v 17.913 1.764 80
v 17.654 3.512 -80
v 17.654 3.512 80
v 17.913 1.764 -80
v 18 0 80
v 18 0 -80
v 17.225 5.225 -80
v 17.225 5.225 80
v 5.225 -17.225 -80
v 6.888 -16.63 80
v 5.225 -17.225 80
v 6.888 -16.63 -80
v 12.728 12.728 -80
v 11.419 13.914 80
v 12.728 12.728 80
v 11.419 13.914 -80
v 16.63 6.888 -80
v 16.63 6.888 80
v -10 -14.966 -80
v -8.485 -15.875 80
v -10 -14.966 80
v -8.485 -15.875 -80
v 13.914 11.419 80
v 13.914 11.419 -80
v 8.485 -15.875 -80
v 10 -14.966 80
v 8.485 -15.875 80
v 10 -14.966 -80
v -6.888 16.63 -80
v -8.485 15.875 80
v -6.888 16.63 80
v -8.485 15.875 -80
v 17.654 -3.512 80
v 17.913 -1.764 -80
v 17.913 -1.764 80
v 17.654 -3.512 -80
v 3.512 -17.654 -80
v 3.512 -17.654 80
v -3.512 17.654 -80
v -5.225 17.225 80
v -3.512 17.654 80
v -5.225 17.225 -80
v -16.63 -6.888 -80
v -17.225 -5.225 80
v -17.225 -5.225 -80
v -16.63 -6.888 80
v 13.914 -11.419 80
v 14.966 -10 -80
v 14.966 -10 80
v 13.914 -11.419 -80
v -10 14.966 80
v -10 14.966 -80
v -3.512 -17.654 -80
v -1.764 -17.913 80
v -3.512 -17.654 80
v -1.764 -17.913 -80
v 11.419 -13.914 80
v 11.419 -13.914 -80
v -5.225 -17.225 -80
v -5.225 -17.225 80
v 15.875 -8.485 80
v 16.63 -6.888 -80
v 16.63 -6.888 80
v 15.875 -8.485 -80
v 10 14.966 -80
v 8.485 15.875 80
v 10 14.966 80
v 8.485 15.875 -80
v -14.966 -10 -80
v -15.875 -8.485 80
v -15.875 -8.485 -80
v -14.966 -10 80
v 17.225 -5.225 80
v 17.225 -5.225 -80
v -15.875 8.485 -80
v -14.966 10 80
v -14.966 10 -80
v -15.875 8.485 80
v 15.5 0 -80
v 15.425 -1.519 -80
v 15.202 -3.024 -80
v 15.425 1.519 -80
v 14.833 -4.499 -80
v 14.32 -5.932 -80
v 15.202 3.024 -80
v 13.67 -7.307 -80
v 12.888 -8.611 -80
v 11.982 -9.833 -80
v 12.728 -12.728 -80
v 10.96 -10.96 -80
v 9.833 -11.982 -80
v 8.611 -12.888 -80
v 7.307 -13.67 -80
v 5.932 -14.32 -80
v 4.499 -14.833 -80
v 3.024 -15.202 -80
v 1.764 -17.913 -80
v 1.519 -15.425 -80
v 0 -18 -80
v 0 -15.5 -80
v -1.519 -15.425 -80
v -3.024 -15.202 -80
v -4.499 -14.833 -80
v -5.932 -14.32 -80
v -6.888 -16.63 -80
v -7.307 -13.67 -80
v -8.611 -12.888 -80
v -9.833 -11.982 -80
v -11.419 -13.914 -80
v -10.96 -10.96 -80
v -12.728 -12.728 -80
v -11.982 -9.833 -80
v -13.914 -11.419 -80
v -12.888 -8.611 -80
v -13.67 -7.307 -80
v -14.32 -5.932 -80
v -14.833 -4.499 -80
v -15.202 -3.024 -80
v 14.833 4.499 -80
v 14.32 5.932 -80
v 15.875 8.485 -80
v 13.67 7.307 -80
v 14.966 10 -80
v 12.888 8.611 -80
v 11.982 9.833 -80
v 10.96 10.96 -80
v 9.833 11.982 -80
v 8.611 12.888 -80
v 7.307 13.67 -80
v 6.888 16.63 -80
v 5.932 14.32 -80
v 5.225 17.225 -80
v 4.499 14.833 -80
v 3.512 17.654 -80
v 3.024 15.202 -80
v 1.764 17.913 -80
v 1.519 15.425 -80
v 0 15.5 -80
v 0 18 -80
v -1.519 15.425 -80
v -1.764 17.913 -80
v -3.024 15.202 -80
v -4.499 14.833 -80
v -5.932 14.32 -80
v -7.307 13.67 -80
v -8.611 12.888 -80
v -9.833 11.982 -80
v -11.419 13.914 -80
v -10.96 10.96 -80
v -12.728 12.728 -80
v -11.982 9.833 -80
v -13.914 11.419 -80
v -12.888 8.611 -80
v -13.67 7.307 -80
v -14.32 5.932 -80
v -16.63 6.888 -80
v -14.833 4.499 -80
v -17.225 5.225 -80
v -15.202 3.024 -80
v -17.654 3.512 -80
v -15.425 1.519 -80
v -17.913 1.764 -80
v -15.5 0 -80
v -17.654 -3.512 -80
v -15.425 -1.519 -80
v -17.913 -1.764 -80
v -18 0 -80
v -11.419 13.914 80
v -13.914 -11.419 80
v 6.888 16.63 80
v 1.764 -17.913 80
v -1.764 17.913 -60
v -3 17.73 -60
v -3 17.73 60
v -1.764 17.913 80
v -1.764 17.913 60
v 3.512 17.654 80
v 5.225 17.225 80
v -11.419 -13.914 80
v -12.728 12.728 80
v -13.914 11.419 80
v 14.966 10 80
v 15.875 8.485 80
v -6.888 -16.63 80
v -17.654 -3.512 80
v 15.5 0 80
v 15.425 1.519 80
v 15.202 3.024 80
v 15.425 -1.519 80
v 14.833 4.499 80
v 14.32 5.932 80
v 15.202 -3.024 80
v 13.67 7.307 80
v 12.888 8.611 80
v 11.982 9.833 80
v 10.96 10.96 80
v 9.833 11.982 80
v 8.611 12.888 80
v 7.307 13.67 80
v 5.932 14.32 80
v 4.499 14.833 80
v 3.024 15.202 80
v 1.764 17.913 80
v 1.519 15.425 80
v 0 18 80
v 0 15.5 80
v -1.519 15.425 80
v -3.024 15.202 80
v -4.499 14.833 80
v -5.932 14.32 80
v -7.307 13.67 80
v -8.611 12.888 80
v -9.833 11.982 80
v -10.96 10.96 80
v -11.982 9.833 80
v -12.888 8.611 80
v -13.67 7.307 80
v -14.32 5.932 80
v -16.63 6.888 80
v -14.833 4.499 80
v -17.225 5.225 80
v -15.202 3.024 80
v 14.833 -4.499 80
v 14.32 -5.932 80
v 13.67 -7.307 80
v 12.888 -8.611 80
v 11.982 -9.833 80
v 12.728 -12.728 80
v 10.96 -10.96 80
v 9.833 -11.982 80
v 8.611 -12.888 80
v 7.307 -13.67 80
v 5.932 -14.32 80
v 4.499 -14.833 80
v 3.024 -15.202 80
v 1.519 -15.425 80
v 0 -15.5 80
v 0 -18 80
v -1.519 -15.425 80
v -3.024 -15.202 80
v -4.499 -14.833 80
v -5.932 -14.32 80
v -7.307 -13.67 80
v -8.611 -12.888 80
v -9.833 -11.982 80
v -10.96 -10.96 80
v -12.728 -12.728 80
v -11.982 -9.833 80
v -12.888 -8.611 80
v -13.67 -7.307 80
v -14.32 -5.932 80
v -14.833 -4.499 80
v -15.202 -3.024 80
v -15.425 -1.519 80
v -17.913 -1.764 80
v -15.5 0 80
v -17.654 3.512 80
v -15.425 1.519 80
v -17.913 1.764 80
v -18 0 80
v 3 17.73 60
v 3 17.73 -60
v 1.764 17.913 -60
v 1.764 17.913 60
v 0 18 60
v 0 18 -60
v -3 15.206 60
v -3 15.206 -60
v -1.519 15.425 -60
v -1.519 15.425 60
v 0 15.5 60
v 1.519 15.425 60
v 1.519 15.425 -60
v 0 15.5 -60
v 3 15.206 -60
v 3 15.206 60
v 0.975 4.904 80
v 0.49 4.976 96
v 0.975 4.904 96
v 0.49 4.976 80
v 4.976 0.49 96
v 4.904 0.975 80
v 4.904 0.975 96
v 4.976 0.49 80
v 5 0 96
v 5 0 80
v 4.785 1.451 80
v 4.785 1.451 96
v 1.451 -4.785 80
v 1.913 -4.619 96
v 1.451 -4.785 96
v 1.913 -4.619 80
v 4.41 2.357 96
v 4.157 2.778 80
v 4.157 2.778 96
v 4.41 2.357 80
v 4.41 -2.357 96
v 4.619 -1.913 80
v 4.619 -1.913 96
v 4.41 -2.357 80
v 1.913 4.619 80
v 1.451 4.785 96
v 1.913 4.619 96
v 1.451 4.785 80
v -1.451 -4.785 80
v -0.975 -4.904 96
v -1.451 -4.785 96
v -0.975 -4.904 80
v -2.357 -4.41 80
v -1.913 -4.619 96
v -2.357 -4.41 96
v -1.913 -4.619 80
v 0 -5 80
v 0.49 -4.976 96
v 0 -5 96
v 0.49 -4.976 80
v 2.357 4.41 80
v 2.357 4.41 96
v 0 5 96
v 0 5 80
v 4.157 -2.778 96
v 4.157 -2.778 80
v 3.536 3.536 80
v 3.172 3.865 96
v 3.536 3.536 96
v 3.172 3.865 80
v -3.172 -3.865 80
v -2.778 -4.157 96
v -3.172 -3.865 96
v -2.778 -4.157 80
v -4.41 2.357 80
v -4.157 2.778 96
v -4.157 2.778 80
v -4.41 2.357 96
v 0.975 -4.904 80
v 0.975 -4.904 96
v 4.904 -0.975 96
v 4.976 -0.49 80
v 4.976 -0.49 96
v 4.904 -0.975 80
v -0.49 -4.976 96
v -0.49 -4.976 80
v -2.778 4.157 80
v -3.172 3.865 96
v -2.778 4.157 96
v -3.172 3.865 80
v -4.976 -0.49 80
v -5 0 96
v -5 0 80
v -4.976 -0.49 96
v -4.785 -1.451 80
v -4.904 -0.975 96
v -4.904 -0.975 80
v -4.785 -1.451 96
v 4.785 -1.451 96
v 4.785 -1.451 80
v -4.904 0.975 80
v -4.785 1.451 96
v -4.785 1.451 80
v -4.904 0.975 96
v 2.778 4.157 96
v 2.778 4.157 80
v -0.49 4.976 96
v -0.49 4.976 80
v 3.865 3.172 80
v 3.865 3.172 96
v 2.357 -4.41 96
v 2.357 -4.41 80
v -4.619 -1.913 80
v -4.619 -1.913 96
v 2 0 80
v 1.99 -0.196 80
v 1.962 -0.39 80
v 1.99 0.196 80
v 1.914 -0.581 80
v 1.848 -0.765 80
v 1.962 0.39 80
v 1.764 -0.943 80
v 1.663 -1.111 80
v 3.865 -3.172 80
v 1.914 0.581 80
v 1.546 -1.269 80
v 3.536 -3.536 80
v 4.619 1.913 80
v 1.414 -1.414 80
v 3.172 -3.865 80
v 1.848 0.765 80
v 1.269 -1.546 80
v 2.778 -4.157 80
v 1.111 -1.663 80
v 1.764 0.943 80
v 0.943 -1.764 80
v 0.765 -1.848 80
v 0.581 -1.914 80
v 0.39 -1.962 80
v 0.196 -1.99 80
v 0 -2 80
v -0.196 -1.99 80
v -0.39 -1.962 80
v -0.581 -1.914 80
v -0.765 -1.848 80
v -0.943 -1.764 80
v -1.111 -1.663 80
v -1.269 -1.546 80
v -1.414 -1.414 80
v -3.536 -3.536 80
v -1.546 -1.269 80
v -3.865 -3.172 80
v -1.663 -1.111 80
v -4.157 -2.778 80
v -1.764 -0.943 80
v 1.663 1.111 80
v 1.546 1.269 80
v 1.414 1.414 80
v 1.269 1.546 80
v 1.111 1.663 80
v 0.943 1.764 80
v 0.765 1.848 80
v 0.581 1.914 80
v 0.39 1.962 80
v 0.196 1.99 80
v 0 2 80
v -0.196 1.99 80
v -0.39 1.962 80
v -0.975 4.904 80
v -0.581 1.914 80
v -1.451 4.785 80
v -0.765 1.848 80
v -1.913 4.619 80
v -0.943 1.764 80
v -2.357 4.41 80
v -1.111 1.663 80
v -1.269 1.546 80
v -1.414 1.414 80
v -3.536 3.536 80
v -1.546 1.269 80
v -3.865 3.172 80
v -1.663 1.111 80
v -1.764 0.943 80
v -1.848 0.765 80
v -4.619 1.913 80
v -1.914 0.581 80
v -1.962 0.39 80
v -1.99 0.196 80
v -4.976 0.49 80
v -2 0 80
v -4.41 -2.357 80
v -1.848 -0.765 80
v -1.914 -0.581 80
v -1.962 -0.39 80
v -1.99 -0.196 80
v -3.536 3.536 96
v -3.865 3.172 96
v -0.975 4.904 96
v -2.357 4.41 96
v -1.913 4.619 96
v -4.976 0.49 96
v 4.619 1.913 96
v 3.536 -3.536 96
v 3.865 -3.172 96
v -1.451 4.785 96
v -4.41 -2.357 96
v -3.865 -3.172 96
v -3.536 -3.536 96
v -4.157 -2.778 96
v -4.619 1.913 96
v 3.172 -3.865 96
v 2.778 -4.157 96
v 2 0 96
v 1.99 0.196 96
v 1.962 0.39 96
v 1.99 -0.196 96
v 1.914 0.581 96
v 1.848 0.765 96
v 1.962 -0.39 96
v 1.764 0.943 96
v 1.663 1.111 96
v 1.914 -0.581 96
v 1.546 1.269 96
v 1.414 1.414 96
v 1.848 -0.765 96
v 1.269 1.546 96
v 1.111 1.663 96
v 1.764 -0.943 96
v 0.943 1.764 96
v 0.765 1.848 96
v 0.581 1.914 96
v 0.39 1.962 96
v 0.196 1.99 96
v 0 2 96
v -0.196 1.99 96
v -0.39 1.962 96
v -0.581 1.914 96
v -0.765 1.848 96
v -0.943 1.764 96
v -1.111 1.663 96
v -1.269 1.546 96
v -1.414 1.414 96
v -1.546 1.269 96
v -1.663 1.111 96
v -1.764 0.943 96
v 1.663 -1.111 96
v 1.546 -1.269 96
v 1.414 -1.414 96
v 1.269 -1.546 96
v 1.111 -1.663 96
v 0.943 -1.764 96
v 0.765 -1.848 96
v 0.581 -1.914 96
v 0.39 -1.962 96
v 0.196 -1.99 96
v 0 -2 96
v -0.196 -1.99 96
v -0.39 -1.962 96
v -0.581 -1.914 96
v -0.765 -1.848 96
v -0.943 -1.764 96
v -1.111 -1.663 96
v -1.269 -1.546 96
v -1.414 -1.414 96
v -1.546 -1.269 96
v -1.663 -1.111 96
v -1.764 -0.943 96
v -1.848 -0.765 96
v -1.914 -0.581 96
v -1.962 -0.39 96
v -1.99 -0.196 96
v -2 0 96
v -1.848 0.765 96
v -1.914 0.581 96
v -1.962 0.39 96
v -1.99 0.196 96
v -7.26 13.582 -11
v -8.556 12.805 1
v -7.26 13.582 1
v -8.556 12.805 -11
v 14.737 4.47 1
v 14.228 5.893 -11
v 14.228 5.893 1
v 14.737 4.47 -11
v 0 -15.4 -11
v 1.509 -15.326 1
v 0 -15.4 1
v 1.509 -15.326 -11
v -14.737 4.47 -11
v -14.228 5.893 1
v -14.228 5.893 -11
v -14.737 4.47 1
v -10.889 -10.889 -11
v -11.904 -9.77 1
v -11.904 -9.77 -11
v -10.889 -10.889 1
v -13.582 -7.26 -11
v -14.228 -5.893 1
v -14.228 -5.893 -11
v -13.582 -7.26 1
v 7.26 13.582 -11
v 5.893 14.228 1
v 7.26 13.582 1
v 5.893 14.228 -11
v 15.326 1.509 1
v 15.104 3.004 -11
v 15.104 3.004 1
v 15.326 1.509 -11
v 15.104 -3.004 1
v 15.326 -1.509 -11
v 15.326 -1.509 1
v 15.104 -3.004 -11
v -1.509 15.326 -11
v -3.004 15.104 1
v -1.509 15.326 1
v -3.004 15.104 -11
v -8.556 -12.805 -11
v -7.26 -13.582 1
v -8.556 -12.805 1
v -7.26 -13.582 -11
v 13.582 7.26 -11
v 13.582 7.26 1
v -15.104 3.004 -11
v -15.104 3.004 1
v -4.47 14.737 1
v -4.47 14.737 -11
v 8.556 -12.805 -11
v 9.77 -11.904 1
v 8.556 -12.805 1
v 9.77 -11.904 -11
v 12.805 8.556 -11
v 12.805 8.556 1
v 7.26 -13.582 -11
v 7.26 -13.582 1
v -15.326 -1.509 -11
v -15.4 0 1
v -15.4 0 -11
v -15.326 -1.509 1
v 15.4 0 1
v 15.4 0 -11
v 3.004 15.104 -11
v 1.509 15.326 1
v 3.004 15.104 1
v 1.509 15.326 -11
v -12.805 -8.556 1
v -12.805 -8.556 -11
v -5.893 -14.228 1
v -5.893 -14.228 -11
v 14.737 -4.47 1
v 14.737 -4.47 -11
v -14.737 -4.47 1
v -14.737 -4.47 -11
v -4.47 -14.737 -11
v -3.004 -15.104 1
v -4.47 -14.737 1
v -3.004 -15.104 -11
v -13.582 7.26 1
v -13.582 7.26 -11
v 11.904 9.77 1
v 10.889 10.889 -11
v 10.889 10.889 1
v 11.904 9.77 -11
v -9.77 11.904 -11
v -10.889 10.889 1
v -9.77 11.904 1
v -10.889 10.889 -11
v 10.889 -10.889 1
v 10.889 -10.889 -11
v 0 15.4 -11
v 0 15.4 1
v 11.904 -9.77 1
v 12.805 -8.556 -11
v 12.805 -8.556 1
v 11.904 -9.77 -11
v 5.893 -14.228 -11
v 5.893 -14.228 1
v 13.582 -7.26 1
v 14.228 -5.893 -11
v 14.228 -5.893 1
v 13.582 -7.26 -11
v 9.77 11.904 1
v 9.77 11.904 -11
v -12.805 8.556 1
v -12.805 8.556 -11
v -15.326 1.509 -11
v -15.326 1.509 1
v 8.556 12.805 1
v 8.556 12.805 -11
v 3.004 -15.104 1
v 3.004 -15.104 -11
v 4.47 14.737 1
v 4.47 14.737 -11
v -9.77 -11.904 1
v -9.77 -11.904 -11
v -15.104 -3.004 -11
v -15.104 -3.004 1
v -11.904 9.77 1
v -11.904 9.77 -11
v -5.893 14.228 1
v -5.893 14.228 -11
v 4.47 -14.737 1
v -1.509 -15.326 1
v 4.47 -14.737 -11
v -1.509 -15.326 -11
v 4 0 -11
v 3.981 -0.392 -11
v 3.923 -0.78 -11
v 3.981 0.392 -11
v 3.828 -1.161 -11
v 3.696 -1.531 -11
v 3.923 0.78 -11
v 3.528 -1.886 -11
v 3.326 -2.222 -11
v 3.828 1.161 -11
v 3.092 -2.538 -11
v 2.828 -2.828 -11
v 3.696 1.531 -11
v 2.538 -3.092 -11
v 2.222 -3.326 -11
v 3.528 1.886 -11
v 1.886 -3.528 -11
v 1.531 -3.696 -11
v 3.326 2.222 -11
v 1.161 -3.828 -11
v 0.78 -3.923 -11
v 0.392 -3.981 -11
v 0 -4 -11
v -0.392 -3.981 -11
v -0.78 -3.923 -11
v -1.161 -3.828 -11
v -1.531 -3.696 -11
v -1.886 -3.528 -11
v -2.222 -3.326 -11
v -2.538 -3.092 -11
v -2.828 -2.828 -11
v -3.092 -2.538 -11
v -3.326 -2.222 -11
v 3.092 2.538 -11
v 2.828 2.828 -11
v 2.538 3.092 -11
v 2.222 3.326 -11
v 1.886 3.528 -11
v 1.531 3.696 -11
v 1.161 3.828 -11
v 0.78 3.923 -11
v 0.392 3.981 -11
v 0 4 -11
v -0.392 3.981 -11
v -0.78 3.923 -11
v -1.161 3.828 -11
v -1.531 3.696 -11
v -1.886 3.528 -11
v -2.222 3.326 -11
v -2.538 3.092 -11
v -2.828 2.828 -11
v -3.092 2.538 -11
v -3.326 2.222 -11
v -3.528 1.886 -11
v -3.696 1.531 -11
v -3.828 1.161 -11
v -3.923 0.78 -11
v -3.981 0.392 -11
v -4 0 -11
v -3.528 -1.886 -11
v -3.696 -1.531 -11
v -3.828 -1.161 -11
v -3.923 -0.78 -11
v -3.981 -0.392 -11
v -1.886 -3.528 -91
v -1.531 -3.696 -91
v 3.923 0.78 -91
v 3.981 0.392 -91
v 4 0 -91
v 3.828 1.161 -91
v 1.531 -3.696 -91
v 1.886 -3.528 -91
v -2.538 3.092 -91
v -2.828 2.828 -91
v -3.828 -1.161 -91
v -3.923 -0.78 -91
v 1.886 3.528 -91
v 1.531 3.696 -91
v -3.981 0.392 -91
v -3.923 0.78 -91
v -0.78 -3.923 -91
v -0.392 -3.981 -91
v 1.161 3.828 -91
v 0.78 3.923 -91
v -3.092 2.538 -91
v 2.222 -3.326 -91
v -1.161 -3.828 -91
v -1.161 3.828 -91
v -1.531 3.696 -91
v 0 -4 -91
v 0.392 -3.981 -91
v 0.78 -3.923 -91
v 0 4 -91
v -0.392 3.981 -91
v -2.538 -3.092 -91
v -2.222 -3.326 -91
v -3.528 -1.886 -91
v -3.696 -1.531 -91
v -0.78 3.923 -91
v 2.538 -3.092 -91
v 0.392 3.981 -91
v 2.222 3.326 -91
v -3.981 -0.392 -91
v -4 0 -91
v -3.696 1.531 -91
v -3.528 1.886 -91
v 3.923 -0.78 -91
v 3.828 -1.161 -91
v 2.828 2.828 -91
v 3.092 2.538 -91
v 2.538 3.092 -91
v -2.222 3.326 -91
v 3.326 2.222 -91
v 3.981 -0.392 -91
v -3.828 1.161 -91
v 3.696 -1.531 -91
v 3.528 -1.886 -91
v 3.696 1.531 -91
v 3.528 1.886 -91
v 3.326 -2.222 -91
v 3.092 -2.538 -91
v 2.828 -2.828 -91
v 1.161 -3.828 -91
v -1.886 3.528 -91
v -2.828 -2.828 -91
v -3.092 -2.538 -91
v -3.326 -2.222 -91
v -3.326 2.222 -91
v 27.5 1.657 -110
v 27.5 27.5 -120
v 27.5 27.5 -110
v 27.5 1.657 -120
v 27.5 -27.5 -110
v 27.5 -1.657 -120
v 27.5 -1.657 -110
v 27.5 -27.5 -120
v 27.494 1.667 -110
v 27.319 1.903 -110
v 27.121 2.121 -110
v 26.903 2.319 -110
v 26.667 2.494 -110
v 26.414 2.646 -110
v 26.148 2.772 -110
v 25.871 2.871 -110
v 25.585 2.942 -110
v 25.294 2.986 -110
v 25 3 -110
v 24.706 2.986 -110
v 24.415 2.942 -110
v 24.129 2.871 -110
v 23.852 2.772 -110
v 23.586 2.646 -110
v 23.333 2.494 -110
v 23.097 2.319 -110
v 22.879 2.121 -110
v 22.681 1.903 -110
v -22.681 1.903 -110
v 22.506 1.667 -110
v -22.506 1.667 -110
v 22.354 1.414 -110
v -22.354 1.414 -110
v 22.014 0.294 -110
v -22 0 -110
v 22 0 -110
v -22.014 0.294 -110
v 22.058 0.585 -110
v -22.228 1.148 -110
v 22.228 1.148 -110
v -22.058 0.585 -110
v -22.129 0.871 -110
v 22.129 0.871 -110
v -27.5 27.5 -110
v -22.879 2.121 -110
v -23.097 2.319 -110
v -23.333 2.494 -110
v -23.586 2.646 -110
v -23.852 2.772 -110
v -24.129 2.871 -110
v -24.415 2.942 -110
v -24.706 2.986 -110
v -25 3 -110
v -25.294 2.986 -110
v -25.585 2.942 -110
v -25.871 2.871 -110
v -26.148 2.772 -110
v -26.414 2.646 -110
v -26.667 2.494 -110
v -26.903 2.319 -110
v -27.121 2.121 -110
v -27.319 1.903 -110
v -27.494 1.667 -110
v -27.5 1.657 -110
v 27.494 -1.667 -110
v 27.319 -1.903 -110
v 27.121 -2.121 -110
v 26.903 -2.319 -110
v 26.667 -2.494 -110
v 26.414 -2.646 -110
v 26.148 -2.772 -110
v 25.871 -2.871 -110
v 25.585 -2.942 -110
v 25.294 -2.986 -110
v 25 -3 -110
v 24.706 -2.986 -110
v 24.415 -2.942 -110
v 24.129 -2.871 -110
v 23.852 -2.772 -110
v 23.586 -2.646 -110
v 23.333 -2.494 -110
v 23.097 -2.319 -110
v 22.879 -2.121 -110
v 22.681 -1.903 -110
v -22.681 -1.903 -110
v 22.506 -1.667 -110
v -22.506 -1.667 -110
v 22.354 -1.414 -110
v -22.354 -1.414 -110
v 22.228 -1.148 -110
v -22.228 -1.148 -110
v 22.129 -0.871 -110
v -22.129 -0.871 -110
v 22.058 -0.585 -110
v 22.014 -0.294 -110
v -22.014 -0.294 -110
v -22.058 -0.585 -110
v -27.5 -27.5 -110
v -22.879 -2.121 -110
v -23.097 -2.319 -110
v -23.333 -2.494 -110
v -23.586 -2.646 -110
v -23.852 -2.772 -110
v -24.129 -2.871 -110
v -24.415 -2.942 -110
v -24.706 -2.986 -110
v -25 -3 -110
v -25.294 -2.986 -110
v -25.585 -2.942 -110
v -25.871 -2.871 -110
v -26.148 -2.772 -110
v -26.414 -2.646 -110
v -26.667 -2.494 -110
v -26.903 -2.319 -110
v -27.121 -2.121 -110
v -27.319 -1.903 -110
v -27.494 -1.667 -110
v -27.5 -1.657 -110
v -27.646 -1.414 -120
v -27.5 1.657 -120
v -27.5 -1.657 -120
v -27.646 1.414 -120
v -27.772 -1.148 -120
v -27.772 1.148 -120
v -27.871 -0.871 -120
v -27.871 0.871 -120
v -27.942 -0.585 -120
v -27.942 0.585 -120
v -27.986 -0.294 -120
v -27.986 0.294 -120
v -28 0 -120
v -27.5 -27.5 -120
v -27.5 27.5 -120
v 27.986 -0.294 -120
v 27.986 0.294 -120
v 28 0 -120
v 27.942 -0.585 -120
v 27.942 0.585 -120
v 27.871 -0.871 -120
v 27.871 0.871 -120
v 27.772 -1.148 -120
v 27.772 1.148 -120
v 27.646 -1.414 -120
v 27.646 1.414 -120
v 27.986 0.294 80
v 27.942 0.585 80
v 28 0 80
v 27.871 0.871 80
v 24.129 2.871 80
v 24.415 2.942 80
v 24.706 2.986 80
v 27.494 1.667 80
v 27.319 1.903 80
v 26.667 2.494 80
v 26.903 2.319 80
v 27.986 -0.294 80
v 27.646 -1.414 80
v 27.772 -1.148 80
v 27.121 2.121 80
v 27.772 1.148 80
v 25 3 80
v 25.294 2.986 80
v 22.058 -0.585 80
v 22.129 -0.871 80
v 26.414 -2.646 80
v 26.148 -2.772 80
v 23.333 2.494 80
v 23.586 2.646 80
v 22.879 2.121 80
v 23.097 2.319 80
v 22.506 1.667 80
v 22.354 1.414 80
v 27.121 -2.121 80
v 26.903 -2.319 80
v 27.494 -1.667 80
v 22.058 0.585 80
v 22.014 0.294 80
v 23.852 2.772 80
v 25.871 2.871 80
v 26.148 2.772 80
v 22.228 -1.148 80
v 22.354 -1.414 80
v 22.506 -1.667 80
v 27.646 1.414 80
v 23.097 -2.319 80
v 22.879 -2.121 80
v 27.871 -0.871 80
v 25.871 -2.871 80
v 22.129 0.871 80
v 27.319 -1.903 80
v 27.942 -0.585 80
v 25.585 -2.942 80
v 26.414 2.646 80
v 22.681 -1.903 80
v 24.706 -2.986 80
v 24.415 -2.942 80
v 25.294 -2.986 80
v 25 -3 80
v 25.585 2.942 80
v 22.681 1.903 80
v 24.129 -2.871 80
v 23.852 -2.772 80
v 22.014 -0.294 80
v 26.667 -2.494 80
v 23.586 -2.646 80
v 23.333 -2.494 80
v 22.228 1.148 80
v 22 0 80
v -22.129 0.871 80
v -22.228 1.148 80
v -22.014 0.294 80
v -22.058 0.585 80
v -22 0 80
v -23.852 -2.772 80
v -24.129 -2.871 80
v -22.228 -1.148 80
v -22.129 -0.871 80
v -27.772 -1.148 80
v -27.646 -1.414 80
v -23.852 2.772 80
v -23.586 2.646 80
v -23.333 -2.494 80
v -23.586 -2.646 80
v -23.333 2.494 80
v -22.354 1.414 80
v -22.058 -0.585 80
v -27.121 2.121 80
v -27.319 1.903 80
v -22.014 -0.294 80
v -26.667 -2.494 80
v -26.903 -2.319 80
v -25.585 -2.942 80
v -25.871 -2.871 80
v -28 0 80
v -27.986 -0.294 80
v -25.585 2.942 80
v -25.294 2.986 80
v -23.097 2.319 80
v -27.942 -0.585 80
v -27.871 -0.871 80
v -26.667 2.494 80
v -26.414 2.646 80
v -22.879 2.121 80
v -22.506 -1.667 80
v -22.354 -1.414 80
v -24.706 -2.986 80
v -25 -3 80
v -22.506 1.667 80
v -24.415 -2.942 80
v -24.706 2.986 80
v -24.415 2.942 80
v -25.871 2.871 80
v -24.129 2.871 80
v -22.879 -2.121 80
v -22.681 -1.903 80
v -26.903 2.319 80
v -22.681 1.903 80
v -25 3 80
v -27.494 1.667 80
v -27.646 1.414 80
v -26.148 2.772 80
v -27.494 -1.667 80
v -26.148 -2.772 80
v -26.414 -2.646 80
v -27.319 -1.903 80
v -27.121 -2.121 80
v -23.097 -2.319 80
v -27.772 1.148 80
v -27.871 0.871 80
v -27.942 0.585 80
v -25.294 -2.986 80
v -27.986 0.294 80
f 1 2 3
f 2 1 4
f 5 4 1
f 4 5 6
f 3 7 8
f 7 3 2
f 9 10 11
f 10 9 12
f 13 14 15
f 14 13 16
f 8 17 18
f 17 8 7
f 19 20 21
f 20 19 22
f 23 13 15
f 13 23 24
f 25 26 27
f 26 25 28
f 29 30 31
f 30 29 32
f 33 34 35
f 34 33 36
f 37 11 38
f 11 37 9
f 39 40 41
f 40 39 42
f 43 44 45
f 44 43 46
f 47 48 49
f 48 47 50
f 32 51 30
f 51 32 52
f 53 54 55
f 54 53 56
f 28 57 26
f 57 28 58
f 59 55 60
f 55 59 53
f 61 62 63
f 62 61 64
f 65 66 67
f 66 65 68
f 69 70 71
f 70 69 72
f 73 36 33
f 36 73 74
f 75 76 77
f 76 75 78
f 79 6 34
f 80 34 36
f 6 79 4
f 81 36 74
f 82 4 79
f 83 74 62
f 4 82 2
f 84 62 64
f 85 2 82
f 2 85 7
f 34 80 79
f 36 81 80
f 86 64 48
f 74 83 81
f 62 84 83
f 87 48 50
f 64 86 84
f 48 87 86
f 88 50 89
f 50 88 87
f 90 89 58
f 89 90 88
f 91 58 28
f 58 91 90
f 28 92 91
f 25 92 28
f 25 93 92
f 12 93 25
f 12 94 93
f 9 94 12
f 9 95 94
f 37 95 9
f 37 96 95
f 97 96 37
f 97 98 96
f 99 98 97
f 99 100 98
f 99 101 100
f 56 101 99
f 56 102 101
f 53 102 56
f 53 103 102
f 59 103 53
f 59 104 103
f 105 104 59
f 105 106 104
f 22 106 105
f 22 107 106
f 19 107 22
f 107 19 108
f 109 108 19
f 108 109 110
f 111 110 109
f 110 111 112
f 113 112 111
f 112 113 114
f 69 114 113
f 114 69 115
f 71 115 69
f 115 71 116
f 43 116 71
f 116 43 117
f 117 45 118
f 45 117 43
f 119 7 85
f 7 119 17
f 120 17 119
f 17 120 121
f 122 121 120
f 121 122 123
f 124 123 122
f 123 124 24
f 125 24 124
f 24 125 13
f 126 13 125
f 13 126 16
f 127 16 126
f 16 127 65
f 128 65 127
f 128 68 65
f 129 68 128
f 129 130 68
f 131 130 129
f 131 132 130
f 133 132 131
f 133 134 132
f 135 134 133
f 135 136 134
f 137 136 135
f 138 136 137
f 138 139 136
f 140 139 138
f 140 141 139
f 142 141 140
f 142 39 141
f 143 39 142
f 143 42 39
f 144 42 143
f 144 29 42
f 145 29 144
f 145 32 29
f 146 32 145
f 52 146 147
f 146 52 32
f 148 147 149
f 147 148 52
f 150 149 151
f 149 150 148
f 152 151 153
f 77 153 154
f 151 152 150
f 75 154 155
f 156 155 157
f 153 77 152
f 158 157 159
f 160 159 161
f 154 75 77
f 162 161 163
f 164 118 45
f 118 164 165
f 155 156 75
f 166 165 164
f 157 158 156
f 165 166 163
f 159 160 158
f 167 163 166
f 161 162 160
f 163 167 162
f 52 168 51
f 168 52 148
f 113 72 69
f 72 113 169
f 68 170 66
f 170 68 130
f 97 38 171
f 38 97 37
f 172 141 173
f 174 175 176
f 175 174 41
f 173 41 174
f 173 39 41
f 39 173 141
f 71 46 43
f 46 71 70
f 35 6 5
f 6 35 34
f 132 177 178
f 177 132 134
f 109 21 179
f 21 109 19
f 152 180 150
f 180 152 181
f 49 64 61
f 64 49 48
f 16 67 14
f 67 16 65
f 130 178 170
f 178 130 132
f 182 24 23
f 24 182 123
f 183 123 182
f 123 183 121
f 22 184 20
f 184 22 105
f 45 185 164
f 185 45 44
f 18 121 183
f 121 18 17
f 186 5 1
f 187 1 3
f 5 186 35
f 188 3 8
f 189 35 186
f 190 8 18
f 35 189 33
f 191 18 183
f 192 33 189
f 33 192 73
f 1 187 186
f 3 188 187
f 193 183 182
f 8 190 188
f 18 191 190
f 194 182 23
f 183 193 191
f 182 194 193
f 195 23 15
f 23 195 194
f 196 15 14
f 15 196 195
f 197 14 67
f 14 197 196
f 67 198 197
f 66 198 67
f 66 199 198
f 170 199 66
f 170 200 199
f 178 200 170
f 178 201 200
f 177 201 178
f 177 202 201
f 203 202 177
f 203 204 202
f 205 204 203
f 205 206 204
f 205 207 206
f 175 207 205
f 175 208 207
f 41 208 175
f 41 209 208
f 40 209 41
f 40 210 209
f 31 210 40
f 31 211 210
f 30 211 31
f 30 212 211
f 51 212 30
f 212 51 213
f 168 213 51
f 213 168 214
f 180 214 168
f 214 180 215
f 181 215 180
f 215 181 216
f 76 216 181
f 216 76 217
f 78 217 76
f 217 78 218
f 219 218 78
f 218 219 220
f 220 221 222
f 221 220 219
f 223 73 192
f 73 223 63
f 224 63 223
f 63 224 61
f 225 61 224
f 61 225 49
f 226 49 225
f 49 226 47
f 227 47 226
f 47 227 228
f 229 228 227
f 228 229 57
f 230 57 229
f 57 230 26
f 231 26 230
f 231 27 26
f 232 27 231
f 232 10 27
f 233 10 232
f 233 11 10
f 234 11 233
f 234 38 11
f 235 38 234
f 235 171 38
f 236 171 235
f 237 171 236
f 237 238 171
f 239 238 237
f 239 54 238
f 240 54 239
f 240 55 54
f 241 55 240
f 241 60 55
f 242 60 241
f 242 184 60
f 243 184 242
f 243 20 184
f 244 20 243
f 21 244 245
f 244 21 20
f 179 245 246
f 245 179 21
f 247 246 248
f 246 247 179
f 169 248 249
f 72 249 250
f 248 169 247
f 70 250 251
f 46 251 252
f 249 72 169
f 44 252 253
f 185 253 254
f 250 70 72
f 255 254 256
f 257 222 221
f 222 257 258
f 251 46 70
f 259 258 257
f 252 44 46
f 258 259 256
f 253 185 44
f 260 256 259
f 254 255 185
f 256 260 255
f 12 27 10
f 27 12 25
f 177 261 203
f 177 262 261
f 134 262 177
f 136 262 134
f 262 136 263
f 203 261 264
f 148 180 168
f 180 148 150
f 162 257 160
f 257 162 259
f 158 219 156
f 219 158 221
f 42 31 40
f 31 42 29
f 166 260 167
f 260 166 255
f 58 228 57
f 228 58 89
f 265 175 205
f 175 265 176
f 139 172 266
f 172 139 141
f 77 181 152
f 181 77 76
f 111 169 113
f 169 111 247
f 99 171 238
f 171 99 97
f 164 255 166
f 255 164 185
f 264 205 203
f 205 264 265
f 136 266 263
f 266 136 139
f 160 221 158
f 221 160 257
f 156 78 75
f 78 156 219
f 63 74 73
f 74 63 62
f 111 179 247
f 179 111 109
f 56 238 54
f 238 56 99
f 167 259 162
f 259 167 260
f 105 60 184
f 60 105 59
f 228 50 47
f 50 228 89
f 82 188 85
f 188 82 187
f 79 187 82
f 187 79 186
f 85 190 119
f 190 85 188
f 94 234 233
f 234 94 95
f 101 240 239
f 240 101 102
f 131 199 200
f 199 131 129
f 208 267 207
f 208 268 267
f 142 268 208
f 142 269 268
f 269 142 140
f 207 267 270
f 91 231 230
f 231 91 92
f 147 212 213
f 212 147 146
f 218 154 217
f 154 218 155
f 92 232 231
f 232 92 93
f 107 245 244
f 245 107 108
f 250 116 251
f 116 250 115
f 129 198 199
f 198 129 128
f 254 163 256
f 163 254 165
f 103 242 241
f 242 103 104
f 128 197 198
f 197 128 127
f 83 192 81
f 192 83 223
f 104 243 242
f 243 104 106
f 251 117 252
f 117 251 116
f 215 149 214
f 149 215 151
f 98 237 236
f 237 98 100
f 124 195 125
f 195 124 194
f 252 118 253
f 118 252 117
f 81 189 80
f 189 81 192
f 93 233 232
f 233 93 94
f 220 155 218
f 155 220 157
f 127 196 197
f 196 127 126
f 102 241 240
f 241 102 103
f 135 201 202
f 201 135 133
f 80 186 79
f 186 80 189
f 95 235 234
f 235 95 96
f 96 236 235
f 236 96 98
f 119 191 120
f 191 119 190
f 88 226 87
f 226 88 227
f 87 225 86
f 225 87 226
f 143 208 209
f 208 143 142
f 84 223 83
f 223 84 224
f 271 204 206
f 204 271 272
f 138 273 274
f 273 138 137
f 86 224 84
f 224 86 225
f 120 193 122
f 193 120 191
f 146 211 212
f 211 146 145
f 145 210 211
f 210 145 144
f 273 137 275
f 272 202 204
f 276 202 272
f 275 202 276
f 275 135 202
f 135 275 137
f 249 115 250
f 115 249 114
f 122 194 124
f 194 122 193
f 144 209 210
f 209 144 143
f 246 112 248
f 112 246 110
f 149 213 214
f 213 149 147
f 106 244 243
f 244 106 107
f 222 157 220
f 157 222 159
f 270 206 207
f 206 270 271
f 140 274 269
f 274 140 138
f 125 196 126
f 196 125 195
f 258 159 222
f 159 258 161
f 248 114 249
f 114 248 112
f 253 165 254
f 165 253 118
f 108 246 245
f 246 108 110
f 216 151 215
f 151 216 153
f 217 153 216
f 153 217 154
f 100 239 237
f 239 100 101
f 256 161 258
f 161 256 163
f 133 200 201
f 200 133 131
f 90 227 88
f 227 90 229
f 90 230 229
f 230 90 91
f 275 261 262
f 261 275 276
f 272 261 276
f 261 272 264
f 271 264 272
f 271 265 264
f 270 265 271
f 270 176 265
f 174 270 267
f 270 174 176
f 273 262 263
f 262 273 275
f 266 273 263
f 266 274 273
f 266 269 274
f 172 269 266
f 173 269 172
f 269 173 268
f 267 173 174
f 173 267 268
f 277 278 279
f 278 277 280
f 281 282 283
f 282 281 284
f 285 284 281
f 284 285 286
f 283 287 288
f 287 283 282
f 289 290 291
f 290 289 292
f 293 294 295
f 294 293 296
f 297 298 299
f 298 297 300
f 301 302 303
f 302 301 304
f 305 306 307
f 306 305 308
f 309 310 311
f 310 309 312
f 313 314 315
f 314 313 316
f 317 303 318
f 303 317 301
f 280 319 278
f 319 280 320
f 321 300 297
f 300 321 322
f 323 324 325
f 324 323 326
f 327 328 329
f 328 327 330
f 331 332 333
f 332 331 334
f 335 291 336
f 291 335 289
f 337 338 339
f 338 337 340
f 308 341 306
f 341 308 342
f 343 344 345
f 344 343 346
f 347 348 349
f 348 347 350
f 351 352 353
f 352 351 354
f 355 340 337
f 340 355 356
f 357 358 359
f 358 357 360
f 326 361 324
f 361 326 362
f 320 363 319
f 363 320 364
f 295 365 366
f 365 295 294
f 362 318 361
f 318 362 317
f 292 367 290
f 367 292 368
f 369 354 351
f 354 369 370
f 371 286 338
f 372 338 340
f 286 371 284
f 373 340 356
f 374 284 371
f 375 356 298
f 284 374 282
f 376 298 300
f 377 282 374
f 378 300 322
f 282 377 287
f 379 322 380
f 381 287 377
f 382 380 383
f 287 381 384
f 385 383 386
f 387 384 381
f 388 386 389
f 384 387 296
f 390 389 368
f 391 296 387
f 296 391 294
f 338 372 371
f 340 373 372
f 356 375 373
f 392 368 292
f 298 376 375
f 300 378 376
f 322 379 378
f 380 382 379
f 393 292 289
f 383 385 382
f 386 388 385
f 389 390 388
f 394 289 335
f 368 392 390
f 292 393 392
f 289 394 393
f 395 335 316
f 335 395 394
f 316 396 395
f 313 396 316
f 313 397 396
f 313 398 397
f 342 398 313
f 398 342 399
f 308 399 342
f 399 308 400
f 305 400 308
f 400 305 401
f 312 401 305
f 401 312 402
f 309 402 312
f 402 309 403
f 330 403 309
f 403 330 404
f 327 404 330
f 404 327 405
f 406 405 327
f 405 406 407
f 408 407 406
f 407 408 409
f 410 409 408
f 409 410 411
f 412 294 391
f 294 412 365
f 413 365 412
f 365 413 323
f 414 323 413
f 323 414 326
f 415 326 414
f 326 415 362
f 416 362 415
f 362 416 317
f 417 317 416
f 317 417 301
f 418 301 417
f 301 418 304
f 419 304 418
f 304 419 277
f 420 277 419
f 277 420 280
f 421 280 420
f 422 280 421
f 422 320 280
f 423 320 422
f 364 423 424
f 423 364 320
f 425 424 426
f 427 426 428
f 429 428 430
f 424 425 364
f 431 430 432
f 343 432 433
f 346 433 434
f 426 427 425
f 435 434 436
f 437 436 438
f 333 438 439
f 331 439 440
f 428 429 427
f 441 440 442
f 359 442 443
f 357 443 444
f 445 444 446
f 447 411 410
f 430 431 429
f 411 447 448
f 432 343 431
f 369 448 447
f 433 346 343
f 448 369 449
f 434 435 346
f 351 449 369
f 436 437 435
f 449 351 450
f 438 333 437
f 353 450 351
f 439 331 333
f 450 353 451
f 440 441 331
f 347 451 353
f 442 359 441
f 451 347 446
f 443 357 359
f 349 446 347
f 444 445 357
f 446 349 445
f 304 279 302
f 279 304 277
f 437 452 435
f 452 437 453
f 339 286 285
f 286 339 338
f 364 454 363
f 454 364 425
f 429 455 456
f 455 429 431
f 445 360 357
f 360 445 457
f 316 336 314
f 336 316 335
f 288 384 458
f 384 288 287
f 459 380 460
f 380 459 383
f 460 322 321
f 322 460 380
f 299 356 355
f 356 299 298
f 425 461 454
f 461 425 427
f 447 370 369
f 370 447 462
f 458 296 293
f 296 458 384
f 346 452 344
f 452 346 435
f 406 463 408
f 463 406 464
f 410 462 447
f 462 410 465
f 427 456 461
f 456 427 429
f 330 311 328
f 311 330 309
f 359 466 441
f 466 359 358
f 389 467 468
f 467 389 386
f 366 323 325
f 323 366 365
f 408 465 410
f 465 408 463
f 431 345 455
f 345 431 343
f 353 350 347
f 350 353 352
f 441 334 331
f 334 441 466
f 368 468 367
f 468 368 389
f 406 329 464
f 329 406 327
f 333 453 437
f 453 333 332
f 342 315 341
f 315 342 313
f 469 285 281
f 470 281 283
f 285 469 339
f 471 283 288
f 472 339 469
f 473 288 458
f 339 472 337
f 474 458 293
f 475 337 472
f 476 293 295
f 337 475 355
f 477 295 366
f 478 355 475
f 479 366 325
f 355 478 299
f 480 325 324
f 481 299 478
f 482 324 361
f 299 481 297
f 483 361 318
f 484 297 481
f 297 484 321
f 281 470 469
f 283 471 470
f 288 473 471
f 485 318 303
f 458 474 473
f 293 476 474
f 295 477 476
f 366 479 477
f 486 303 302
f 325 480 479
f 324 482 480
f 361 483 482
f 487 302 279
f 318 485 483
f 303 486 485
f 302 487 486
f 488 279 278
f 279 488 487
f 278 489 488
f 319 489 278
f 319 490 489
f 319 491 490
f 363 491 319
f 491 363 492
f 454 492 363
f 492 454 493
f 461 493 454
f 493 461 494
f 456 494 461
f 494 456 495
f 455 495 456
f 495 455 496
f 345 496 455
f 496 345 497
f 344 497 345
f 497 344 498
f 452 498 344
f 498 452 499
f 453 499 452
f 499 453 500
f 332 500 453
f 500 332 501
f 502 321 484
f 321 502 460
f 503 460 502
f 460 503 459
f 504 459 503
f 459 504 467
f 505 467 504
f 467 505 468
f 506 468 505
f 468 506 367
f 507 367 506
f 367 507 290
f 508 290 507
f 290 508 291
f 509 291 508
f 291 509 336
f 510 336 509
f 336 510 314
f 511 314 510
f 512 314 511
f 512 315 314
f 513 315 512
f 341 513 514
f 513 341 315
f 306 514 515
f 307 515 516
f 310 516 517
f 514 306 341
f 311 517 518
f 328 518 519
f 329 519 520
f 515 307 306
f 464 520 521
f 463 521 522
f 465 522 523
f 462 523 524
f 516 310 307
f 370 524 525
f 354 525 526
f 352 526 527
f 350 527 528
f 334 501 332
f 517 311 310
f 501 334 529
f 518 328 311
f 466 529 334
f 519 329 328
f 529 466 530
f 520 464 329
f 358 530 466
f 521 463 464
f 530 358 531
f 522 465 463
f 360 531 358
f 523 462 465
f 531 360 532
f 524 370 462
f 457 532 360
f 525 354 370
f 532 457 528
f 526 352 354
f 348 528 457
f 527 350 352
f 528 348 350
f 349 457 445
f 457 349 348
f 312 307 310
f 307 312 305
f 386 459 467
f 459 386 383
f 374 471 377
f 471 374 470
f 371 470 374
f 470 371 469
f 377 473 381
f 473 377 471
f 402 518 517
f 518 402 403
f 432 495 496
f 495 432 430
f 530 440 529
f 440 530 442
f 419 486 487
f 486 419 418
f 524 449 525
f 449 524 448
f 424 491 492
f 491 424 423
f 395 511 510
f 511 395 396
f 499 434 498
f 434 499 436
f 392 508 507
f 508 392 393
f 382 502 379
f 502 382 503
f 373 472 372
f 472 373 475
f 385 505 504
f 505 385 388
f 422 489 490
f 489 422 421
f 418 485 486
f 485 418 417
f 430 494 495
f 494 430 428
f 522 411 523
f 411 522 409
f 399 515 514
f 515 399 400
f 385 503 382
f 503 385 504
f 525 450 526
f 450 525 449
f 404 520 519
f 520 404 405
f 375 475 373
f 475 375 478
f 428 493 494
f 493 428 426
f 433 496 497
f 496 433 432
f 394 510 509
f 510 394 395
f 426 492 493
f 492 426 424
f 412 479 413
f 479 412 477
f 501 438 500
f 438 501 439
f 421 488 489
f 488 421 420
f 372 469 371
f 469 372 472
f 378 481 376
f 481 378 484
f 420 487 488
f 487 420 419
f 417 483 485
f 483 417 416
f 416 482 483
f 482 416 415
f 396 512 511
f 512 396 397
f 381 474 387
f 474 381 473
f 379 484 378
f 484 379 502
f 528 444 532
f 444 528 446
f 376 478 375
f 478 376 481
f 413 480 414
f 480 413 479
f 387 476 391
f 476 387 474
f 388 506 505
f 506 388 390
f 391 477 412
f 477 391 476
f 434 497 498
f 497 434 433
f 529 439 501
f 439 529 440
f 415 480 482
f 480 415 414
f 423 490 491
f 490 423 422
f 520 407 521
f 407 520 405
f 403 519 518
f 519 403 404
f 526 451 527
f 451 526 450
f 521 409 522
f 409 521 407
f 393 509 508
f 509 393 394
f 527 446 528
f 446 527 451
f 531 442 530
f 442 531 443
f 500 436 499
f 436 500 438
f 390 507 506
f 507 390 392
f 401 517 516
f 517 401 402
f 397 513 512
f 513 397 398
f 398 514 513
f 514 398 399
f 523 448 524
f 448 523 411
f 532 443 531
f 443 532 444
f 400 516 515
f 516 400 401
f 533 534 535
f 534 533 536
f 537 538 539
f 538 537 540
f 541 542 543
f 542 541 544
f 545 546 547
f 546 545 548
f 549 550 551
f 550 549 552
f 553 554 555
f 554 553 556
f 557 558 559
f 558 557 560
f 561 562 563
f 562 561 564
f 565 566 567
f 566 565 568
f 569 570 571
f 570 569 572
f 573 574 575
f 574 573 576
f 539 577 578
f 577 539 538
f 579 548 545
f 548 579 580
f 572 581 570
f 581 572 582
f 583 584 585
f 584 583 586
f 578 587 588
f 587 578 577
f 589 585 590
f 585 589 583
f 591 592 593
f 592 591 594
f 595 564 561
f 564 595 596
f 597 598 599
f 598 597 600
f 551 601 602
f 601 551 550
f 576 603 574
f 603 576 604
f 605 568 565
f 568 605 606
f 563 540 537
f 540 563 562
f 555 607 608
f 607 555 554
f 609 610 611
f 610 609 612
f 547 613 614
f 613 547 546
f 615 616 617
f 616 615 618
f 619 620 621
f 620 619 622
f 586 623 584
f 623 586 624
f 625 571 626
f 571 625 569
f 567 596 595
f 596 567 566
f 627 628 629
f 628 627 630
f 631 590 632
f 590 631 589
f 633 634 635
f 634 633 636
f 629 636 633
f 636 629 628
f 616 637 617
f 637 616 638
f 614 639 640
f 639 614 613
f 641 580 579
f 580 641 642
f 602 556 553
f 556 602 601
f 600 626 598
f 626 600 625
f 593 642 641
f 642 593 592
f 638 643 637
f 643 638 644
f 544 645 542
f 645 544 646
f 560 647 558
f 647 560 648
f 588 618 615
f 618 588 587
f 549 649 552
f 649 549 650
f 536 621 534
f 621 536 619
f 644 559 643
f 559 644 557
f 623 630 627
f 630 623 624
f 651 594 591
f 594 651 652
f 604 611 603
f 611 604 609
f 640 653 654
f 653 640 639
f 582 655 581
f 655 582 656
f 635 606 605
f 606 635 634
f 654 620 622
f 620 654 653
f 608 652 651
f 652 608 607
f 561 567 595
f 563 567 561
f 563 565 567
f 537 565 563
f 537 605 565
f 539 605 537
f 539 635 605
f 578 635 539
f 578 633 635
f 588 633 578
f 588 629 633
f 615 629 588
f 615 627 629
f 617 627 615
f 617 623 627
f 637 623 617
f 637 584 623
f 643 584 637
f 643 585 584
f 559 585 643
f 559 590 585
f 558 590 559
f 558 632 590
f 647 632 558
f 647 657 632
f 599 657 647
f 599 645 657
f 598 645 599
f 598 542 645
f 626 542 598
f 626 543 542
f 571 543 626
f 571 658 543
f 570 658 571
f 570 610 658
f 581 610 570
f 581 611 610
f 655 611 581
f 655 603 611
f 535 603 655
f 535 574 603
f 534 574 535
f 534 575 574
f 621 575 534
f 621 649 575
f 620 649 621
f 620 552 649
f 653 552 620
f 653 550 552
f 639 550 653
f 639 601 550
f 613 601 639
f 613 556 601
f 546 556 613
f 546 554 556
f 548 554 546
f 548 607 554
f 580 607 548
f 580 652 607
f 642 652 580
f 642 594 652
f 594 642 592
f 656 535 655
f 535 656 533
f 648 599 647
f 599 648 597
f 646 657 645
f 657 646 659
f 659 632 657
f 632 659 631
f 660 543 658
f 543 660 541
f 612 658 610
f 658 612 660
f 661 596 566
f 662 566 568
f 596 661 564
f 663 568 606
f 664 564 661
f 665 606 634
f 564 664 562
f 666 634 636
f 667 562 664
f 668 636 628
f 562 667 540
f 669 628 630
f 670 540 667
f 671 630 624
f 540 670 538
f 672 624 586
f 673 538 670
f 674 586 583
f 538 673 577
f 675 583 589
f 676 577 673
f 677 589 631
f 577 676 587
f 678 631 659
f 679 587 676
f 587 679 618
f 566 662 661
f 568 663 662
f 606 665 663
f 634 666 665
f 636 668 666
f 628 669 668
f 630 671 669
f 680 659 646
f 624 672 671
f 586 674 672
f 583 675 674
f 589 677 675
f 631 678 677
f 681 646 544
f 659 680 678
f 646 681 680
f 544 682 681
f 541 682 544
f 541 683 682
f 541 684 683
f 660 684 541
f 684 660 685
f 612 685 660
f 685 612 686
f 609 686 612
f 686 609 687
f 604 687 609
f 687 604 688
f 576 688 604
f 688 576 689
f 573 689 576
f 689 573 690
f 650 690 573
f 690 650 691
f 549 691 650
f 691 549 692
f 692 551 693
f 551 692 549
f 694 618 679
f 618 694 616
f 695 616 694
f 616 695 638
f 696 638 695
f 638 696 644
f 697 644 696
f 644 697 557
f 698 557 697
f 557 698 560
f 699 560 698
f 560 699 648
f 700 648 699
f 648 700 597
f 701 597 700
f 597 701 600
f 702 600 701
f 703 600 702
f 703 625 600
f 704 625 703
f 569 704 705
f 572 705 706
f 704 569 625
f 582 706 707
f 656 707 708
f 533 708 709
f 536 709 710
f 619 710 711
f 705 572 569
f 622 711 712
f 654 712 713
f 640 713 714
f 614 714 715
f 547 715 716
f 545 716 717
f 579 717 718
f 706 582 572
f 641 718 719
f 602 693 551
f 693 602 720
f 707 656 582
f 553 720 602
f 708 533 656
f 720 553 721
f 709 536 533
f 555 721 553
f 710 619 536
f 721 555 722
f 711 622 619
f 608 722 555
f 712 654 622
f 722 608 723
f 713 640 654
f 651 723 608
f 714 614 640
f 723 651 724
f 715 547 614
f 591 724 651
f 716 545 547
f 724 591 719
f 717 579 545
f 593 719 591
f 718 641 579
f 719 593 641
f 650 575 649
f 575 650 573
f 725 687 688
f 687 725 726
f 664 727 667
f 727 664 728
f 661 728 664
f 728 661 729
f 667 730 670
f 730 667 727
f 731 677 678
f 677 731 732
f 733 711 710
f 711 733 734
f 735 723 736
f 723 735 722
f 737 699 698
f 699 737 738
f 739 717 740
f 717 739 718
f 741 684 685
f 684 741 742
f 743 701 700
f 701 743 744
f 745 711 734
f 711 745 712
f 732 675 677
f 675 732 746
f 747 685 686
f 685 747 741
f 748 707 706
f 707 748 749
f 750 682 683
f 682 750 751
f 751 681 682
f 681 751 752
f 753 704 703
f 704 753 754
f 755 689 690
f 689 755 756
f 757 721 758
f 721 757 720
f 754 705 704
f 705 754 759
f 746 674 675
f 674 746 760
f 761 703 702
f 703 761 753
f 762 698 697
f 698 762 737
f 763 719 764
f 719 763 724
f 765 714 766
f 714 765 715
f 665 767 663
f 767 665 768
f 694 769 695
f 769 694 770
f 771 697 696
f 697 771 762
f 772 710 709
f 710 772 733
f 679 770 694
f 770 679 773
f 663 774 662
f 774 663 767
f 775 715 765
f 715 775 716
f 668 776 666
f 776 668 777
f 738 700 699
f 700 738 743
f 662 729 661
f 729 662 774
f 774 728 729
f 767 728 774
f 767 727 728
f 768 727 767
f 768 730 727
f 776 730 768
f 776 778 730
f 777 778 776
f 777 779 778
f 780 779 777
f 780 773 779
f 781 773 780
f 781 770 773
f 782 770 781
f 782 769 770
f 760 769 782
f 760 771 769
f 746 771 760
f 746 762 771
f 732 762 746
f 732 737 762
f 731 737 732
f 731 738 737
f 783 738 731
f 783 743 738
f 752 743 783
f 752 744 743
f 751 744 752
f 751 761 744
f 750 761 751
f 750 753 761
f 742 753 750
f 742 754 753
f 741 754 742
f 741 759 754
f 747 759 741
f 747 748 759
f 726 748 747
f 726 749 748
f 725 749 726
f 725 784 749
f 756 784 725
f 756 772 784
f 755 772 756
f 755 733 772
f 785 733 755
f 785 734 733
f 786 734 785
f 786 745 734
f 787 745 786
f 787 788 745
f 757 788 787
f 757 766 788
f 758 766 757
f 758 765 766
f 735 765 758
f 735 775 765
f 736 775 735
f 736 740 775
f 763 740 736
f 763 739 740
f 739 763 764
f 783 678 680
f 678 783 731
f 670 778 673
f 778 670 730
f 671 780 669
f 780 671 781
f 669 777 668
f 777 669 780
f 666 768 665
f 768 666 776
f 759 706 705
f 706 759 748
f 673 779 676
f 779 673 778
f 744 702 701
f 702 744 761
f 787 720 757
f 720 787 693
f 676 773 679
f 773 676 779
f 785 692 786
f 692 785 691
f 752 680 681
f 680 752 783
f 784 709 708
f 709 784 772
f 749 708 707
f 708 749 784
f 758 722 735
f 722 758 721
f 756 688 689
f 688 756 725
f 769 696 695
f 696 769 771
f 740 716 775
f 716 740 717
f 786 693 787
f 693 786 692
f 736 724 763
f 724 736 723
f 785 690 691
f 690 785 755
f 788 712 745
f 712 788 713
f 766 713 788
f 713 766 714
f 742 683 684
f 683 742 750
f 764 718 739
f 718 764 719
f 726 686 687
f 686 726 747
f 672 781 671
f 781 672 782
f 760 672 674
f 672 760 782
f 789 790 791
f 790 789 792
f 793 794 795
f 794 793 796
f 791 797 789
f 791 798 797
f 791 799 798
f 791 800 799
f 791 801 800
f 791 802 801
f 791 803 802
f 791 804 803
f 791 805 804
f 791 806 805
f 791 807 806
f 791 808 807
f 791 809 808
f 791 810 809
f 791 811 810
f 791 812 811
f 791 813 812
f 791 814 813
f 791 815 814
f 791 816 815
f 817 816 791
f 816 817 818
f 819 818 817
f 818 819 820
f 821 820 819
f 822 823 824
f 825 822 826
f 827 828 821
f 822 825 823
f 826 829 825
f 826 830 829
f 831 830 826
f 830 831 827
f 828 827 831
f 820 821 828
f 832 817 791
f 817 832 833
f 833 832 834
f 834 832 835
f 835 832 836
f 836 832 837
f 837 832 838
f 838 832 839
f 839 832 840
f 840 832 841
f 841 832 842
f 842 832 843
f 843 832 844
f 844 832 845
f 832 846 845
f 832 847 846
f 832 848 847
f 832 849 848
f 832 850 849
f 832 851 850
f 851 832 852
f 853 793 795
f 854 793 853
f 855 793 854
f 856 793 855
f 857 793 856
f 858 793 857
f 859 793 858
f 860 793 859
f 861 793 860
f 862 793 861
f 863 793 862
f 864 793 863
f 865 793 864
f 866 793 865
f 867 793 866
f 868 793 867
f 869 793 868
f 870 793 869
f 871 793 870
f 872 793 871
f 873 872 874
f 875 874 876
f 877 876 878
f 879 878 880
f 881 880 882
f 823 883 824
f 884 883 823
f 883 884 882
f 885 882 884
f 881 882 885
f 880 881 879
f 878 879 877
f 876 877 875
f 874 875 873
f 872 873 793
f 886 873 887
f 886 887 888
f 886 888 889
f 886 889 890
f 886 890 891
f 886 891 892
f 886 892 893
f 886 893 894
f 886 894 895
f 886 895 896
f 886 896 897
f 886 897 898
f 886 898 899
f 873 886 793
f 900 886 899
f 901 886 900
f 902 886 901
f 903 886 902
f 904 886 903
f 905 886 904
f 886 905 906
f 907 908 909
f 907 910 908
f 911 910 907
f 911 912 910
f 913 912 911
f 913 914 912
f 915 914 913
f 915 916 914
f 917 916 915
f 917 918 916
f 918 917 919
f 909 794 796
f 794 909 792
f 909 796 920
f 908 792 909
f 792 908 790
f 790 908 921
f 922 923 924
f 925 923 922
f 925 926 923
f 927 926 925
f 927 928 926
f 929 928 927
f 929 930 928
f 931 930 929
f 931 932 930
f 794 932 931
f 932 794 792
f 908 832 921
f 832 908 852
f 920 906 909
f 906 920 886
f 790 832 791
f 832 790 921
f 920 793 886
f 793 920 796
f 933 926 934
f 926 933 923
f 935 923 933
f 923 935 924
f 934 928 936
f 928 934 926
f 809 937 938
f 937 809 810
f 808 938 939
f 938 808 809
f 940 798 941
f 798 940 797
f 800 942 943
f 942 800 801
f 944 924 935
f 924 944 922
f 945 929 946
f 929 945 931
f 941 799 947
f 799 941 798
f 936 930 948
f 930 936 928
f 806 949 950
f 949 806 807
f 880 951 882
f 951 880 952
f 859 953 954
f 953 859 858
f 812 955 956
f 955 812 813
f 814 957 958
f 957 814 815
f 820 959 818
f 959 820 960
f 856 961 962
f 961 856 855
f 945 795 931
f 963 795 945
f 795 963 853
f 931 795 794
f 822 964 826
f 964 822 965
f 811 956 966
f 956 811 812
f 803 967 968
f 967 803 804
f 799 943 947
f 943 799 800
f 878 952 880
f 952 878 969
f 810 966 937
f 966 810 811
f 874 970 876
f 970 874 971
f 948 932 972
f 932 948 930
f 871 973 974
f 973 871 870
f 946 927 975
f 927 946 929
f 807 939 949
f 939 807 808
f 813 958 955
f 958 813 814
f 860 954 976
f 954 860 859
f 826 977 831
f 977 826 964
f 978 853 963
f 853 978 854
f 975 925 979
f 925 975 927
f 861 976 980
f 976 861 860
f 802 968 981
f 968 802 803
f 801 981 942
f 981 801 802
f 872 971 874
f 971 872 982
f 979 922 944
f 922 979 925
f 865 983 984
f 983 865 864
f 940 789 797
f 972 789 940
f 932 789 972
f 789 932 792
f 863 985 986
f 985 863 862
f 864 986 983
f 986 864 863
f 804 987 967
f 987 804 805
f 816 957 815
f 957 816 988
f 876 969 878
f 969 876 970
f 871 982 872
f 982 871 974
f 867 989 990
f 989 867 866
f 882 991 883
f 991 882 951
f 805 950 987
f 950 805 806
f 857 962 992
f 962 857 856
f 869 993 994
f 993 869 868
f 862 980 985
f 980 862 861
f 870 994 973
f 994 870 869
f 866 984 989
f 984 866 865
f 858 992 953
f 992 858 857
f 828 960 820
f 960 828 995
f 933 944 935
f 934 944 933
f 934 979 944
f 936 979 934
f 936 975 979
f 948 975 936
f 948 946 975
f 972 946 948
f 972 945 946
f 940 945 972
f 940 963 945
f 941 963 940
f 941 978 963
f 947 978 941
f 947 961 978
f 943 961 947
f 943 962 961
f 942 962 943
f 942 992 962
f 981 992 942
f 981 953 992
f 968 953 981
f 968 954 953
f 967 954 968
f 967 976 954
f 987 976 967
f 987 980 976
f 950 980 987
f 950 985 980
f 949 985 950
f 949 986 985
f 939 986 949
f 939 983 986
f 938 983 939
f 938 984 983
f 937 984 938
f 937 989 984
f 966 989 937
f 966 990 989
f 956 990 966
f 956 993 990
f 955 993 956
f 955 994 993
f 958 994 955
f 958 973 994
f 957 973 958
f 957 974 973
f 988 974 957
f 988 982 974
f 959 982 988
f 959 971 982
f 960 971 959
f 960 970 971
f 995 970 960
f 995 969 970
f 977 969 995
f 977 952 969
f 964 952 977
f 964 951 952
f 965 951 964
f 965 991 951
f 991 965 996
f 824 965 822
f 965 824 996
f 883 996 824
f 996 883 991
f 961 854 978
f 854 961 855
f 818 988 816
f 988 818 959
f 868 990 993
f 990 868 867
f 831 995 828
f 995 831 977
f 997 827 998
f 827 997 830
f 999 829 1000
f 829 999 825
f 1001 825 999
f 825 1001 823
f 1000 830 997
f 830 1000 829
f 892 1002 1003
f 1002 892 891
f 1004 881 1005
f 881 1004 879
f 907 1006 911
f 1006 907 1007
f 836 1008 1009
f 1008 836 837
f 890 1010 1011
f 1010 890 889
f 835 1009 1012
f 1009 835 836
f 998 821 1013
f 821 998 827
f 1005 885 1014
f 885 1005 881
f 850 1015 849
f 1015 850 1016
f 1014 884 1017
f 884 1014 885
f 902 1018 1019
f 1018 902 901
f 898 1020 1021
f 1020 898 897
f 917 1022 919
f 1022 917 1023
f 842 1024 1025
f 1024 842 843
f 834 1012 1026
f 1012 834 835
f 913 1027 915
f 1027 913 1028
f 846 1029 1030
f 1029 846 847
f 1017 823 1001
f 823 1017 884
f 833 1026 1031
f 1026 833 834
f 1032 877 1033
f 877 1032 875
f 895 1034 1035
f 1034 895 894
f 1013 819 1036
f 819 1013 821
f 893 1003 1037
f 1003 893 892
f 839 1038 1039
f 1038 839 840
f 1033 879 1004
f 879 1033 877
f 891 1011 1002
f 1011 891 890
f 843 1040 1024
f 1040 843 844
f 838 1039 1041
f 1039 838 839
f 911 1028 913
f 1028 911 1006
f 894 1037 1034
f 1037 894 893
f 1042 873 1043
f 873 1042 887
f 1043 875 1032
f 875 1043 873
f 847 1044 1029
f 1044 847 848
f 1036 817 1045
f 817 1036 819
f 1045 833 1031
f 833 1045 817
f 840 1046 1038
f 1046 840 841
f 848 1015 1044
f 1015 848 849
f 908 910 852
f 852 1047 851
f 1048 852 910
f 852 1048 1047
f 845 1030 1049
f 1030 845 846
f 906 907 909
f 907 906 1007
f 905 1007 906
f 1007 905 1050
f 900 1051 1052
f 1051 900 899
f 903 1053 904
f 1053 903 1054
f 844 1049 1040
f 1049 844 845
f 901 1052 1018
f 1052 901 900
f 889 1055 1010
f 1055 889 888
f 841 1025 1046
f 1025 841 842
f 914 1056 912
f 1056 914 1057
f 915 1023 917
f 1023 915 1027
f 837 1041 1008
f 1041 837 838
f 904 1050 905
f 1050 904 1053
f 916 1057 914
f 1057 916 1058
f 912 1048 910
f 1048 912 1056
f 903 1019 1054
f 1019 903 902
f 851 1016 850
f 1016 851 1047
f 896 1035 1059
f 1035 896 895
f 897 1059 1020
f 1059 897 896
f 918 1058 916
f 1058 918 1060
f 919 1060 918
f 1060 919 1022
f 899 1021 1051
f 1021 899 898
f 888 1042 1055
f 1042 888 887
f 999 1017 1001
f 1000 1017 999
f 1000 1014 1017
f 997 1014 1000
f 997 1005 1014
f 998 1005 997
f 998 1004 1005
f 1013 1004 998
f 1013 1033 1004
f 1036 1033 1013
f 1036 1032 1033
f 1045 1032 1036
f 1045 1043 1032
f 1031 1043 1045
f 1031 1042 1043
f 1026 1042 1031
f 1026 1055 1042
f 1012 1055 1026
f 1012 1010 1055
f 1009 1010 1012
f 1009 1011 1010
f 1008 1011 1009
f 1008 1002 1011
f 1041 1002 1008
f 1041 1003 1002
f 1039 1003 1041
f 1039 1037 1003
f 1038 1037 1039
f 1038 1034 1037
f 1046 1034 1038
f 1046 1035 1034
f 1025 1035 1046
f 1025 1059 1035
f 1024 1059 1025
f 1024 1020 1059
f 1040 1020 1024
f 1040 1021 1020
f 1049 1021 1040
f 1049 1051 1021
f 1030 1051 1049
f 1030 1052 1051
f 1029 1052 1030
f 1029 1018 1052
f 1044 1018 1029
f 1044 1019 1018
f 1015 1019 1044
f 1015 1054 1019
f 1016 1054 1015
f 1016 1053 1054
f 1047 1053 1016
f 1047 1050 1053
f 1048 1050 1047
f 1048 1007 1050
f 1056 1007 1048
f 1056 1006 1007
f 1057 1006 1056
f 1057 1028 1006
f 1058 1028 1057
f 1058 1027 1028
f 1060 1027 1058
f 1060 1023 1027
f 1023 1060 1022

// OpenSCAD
// File: docs/hardware/mechanical/biochem_extraction_syringe.scad
// System: USS Iowa Biochemical Lab Module - Motorized Fluid Extraction Syringe
// High-accuracy linear stepper-driven positive displacement pump geometry

$fn = 64;

// Syringe and Linear Rail Parameters (in millimeters)
barrel_length  = 160.0;
barrel_outer_r = 18.0;
barrel_wall_t  = 2.5;
plunger_pos    = 75.0; // Dynamic parameter: linear displacement down the track
rod_radius     = 4.0;

module pump_barrel() {
    difference() {
        // Transparent Main Fluid Reservoir Cylinder
        color("ghostwhite", 0.4) 
            cylinder(r = barrel_outer_r, h = barrel_length, center = true);
        
        // Internal Fluid Storage Core
        cylinder(r = barrel_outer_r - barrel_wall_t, h = barrel_length + 2, center = true);
        
        // Mounting cutout slot for optical level fluid tracking sensors
        translate([0, barrel_outer_r - 2, 0])
            cube([6, 6, barrel_length - 40], center = true);
    }
    
    // Front Discharge Nozzle Adapter (Luer-Lock integration zone)
    translate([0, 0, barrel_length/2 + 8]) {
        color("darkblue") {
            difference() {
                cylinder(r = 5.0, h = 16, center = true);
                cylinder(r = 2.0, h = 18, center = true); // Internal fluid egress path
            }
        }
    }
}

module motorized_plunger_assembly(displacement) {
    // Internal sealing piston ring and mechanical lead screw drive coupling
    translate([0, 0, -barrel_length/2 + displacement]) {
        // Neoprene primary sealing face gasket
        color("black") 
            cylinder(r = barrel_outer_r - barrel_wall_t - 0.1, h = 12, center = true);
        
        // Stainless steel driving pushrod extending backwards to linear guide block
        translate([0, 0, -barrel_length/4 - 6])
            color("silver") 
                cylinder(r = rod_radius, h = barrel_length/2, center = true);
    }
}

module linear_actuator_rails() {
    // Structural framework brackets anchoring lead screw bearings and guide rods
    color("darkgrey") {
        // Backstop stepper motor structural adapter plate
        translate([0, 0, -barrel_length/2 - 35])
            cube([55, 55, 10], center = true);
            
        // Dual lateral guide support rods preventing rotational torque displacement
        translate([ 25, 0, -20]) cylinder(r = 3.0, h = barrel_length + 40, center = true);
        translate([-25, 0, -20]) cylinder(r = 3.0, h = barrel_length + 40, center = true);
    }
}

// Complete Assembly Pipeline Compilation
union() {
    pump_barrel();
    motorized_plunger_assembly(plunger_pos);
    linear_actuator_rails();
}
